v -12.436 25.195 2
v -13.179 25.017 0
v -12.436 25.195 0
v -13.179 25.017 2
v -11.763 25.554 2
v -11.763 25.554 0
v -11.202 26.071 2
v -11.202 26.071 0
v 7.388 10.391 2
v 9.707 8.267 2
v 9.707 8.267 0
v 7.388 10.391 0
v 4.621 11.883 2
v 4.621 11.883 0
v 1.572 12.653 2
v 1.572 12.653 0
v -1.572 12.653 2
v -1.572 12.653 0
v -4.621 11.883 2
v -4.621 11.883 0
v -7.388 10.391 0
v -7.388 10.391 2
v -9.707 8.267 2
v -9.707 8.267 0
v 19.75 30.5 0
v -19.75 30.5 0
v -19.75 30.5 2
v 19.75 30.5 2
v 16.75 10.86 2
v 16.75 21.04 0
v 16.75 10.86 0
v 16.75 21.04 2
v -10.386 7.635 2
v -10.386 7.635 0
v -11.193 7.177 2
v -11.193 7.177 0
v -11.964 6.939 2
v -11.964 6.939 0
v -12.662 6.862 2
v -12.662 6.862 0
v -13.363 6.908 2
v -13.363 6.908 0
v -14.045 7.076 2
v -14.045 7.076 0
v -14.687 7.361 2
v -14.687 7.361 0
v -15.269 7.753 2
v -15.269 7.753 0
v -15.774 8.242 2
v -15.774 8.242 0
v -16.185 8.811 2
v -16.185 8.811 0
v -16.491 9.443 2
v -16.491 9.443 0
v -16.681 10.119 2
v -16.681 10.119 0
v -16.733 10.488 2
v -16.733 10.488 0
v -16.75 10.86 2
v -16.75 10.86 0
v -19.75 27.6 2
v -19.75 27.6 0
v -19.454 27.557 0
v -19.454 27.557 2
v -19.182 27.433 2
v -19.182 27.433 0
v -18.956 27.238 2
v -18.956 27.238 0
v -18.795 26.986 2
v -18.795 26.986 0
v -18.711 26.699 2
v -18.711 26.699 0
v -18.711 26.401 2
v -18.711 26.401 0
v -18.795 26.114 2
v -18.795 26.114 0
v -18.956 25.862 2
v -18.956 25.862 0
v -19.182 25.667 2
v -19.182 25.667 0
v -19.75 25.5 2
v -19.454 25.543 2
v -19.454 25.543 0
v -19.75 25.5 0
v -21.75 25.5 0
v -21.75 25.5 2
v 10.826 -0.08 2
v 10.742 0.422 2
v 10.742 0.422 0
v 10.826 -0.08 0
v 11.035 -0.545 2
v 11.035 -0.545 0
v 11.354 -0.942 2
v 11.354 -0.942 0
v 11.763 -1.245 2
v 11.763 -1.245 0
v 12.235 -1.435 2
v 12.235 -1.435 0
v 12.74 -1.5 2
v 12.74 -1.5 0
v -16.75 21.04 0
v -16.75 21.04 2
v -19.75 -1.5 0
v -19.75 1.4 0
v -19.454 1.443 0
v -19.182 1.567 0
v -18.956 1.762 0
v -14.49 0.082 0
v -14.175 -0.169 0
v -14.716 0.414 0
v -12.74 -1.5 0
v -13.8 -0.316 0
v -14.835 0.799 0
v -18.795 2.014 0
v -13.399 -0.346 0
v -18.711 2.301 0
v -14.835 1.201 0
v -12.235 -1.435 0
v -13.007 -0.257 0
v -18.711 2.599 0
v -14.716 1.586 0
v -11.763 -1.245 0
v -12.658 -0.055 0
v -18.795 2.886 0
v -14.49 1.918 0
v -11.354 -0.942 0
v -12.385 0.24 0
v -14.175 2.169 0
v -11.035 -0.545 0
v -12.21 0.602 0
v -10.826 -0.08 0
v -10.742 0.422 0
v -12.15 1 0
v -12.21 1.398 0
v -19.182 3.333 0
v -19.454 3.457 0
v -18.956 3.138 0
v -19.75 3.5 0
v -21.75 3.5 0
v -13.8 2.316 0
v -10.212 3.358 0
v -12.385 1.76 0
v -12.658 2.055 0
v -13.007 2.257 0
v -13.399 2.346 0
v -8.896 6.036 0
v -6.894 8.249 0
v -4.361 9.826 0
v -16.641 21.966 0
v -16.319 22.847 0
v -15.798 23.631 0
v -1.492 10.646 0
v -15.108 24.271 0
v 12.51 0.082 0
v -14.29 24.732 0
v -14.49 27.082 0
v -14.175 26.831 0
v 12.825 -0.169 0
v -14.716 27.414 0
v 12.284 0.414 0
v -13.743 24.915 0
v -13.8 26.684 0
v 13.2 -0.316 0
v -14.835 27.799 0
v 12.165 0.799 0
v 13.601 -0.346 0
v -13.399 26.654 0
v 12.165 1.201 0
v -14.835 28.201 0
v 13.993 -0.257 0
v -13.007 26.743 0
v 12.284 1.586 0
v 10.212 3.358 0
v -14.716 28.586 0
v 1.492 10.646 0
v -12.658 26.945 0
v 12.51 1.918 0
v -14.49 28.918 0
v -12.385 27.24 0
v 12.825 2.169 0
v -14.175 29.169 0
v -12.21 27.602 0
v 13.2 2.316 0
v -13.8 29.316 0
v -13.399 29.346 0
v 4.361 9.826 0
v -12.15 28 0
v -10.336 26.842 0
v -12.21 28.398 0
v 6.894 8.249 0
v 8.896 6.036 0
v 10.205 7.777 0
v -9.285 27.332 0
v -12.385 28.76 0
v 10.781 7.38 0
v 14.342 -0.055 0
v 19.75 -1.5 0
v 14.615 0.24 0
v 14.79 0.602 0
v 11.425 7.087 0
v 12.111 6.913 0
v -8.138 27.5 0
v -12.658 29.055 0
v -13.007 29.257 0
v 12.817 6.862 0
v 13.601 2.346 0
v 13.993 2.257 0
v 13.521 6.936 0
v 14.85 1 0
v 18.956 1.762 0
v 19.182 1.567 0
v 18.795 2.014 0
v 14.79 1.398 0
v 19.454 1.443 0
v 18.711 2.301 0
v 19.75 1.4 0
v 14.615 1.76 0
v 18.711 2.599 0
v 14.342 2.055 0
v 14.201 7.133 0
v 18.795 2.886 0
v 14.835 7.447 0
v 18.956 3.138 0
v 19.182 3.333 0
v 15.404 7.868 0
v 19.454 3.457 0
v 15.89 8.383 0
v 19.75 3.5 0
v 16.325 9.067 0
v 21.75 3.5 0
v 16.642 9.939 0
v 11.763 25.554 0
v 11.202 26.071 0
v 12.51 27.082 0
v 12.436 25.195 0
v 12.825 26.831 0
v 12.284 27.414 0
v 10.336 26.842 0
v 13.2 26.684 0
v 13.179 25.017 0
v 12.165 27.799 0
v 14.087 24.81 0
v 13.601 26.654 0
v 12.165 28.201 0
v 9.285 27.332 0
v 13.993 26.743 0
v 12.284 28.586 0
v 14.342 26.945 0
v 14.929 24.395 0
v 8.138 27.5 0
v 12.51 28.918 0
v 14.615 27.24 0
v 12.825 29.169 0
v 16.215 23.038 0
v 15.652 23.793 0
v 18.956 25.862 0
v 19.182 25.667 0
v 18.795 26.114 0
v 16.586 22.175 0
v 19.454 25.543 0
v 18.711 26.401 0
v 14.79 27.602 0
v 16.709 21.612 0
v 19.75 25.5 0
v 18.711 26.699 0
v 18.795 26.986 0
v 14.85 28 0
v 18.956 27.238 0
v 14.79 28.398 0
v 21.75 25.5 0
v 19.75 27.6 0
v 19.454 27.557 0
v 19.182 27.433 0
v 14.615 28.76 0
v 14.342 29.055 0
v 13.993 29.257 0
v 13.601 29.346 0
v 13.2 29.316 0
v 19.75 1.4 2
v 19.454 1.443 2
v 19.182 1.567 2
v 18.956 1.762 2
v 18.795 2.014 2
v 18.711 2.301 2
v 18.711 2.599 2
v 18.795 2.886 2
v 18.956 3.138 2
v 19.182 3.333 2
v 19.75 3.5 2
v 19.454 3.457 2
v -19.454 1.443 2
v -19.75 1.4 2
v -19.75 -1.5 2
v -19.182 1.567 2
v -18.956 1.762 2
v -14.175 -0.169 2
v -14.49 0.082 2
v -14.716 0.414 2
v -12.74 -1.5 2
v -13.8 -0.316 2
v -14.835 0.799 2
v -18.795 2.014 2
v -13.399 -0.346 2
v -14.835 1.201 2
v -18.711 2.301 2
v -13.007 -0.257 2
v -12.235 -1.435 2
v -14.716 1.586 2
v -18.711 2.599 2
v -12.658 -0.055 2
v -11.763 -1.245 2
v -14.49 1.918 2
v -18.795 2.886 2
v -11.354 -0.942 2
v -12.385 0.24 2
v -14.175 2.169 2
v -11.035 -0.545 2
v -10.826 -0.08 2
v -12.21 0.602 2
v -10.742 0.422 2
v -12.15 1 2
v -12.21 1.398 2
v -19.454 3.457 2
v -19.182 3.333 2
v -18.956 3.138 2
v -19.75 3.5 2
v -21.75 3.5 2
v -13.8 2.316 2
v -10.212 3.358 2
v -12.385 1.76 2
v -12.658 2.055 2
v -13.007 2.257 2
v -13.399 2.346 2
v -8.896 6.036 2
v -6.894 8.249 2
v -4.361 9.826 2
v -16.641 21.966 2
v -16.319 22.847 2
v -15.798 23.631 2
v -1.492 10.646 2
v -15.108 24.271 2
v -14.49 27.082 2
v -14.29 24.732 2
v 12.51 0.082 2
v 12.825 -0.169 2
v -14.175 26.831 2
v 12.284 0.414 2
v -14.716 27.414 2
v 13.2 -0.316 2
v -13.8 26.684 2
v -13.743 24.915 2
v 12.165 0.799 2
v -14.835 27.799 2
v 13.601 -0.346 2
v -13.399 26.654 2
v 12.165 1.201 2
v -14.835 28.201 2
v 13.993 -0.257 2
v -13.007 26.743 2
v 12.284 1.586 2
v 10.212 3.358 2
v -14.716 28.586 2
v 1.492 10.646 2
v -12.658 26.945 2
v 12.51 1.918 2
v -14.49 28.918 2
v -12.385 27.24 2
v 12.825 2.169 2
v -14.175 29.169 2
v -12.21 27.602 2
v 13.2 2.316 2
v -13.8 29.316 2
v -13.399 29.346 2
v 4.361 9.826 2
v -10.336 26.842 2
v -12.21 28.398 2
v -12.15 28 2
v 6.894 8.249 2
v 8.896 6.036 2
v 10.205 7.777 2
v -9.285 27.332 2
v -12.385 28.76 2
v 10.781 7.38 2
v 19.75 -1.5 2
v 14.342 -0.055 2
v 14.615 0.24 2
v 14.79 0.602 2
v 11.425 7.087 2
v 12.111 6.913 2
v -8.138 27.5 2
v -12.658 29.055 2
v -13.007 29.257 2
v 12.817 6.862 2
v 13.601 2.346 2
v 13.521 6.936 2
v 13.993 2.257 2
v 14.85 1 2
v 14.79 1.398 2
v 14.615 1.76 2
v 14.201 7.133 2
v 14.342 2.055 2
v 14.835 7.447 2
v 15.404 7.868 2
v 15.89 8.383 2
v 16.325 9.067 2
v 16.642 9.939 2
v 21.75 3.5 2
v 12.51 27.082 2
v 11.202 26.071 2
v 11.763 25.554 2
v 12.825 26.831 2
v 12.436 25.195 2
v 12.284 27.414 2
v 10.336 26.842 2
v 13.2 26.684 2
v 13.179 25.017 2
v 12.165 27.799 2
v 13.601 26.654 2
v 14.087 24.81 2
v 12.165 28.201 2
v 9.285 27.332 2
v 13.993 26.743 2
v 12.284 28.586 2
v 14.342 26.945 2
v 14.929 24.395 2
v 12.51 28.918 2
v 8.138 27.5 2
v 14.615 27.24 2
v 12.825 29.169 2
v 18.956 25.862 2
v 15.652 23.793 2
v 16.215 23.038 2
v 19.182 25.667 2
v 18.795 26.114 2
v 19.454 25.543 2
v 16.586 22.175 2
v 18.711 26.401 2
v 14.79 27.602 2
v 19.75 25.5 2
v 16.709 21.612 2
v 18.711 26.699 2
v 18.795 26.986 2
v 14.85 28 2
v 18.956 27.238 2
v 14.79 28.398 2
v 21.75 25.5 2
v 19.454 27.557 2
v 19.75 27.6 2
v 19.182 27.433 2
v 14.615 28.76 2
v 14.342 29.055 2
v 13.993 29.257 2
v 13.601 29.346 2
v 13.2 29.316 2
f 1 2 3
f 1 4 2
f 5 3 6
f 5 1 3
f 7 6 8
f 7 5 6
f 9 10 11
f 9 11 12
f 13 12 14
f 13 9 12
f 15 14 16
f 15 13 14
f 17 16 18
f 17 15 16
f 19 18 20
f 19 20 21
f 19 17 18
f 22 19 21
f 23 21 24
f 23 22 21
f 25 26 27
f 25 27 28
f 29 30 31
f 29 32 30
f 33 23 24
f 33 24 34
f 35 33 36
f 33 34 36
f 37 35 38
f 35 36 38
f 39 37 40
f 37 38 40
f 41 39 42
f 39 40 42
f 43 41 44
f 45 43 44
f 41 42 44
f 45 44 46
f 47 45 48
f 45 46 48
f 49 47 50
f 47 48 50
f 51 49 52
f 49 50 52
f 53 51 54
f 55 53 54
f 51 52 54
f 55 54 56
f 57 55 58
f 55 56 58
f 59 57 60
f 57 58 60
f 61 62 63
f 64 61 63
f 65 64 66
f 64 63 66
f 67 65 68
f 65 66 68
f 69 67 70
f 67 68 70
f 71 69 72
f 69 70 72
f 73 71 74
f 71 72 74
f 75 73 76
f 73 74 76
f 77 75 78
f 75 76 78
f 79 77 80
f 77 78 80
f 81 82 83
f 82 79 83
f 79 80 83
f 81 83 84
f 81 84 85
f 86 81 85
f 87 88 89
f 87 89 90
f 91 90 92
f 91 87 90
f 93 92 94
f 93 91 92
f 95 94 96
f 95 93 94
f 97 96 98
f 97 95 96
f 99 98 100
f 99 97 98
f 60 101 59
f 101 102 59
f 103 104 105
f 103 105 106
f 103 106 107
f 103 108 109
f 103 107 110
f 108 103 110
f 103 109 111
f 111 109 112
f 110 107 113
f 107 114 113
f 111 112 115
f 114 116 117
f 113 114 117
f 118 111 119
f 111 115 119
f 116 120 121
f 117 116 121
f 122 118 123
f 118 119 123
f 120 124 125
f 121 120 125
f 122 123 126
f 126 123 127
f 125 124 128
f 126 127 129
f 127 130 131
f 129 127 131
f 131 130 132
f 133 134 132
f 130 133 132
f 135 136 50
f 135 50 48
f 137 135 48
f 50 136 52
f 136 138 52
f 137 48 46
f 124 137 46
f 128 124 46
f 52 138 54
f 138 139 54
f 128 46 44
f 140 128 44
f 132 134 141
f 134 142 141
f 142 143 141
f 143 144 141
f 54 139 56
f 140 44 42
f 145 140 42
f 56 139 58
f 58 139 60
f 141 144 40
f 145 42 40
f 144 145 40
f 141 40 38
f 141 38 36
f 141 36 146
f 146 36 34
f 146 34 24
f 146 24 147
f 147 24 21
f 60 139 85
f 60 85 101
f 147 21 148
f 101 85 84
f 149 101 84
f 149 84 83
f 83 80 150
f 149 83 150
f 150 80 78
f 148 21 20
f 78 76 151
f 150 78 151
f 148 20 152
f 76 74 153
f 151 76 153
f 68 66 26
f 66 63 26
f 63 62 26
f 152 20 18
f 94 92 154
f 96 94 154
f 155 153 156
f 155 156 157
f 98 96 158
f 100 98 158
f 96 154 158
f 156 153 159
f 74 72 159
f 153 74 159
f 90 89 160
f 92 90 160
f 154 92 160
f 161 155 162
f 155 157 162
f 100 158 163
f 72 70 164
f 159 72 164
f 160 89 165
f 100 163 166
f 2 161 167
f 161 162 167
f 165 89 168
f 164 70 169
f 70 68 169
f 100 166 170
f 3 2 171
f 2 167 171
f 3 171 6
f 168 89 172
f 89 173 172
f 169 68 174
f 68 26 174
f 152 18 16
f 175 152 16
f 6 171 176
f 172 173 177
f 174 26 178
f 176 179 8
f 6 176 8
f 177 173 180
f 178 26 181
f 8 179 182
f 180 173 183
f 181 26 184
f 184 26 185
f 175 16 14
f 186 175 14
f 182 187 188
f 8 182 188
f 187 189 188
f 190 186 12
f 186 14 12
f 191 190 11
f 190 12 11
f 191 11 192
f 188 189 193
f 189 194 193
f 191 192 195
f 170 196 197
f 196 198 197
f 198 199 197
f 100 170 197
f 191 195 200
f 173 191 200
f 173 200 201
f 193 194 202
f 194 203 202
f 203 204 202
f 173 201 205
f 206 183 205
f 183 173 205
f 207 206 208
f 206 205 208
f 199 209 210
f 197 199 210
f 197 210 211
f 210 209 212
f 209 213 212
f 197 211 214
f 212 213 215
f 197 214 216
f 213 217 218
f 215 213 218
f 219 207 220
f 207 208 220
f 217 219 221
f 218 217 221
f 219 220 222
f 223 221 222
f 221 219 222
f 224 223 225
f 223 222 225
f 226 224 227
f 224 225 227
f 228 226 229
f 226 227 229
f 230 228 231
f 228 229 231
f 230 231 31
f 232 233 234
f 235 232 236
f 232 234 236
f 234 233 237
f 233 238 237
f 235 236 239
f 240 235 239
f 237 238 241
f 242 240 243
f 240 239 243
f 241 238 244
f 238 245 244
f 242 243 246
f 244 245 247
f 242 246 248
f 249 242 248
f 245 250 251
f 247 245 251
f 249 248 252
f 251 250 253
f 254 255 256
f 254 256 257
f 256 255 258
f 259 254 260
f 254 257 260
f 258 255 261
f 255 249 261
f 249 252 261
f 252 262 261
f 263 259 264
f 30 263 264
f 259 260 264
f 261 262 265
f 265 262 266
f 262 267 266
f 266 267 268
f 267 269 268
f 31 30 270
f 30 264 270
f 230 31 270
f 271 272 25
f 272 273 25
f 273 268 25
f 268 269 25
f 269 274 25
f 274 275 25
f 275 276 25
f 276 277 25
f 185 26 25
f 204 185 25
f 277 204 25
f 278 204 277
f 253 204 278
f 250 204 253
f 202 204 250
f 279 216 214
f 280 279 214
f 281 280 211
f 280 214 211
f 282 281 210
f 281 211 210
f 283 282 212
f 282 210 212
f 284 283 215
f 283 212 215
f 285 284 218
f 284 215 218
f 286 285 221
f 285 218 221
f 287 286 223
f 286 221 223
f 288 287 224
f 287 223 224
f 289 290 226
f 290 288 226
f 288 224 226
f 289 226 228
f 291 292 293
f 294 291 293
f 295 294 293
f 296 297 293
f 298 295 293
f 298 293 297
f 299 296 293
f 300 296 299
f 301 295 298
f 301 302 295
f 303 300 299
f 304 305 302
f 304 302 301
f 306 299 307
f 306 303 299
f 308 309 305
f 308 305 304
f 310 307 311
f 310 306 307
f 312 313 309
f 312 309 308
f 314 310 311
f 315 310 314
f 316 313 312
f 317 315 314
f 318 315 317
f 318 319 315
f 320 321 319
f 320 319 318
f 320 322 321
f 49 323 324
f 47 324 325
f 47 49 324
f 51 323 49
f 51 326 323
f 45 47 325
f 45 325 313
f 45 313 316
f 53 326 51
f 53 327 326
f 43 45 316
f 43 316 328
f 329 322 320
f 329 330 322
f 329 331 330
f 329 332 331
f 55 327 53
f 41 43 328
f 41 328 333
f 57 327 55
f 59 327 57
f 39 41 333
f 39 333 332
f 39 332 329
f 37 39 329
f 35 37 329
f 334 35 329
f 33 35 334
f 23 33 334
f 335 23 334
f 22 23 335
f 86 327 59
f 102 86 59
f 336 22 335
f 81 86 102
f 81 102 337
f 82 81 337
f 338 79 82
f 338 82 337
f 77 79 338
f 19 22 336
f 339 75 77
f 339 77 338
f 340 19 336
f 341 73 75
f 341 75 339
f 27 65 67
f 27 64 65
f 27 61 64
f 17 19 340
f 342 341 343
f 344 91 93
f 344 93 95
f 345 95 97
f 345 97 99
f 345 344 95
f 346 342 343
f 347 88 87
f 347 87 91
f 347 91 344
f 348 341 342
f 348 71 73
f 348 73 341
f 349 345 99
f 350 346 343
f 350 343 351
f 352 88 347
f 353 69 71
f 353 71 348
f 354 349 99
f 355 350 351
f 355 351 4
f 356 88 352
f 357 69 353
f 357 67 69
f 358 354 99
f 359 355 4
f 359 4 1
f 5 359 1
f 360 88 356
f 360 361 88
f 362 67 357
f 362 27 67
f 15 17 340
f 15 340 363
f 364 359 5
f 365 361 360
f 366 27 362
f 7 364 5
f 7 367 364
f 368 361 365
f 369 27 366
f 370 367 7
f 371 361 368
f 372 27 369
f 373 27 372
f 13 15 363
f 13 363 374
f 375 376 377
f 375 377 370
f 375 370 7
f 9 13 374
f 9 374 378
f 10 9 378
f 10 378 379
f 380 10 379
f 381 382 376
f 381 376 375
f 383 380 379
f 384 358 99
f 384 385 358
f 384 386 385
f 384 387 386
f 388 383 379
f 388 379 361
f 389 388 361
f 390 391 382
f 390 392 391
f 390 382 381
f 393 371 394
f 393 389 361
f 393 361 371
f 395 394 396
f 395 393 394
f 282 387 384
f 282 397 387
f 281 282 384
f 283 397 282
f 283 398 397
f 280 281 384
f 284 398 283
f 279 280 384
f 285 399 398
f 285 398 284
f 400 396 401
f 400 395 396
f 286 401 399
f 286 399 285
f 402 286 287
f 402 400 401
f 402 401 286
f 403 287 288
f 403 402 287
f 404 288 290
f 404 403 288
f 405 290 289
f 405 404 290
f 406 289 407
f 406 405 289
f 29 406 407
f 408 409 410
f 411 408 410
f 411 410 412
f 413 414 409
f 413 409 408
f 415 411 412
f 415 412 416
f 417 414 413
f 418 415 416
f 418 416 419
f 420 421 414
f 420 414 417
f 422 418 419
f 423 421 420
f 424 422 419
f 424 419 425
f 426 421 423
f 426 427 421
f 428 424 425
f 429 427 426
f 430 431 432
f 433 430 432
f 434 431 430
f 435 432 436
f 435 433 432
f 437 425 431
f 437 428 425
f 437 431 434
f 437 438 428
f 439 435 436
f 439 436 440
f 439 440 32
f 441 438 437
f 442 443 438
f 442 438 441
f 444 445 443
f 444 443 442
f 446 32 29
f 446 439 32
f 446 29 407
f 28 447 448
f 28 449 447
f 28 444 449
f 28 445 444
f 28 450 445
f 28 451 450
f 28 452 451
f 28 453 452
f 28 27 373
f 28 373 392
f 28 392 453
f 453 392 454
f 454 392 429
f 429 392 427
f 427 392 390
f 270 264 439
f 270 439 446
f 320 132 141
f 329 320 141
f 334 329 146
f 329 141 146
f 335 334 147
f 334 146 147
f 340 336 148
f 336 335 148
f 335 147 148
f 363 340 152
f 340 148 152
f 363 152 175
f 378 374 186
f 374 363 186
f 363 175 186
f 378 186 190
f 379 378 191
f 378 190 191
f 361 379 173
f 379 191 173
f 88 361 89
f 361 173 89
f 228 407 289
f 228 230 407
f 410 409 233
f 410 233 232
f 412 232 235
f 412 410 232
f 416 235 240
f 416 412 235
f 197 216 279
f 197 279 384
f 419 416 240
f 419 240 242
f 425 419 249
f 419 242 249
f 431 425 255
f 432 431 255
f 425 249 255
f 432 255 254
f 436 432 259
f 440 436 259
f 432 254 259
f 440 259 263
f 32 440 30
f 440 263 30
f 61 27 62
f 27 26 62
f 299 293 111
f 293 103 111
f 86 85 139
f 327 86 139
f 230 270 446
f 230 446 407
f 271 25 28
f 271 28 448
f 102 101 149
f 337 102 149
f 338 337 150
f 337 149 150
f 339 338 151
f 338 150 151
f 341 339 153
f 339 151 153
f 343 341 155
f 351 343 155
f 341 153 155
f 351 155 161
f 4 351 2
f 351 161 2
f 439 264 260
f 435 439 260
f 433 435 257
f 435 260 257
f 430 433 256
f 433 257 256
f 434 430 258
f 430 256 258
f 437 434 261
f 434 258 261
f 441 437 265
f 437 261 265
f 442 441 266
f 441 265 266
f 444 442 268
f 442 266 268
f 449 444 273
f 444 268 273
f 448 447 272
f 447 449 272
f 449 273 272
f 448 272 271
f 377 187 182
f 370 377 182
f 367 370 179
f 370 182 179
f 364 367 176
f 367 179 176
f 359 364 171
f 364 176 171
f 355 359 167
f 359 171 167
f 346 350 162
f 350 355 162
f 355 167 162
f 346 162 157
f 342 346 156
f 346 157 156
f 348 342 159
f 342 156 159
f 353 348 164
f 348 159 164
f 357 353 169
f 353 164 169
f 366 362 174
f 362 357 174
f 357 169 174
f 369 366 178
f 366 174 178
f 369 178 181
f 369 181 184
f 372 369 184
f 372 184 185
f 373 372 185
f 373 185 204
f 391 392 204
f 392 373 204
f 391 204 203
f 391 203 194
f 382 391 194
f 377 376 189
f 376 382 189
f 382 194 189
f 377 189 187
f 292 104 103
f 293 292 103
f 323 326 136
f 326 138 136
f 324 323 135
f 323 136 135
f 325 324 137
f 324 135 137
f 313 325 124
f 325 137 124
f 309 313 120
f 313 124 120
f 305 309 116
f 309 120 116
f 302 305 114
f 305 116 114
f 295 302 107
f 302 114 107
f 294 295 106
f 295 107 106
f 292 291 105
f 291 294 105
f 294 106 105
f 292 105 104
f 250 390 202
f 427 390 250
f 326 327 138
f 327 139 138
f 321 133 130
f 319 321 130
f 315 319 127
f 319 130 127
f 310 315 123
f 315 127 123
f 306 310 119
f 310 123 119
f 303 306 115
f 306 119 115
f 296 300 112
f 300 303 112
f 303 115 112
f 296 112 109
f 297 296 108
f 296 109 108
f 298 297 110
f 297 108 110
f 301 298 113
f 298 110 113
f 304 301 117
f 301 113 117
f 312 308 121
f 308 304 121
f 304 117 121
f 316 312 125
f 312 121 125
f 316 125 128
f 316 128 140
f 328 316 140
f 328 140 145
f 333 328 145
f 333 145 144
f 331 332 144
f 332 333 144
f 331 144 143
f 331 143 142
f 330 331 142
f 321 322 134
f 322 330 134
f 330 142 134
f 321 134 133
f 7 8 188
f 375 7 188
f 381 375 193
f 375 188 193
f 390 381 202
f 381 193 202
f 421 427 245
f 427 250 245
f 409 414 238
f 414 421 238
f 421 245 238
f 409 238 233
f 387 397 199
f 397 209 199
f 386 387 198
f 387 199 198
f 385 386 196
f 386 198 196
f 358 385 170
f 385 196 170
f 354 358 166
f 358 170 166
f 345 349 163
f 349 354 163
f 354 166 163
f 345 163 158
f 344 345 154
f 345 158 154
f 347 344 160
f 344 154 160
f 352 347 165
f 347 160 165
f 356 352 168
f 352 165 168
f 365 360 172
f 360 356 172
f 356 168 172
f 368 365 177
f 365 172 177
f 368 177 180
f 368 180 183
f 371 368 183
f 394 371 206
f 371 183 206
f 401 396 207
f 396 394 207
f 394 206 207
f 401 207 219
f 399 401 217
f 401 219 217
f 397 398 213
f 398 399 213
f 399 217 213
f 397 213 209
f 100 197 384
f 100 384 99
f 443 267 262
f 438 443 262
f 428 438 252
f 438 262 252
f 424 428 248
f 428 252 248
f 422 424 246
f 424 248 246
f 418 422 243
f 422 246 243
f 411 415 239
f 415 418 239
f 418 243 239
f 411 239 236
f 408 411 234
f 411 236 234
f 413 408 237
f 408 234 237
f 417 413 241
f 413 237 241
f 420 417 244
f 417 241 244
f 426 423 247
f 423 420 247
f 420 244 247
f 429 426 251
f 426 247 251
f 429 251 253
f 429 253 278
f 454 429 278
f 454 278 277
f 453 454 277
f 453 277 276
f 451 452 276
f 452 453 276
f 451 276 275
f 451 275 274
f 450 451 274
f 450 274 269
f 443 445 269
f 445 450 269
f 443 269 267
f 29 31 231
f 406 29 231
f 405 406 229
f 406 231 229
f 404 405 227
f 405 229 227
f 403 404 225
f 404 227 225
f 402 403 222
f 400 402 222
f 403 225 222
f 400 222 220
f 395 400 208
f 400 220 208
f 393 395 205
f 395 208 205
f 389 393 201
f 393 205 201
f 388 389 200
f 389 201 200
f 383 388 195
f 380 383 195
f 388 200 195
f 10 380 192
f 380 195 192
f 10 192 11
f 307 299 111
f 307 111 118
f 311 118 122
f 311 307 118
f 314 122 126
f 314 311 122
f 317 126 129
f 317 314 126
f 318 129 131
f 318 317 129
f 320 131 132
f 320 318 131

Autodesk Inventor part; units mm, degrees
ref_plane "YZ Plane" through (0, 0, 0) normal (1, 0, 0) x (0, 1, 0)
ref_plane "XZ Plane" through (0, 0, 0) normal (0, 1, 0) x (-1, 0, 0)
ref_plane "XY Plane" through (0, 0, 0) normal (0, 0, 1) x (1, 0, 0)
sketch "スケッチ1" plane through (0, 0, 0) normal (0, 0, 1) x (1, 0, 0)
  circle A0 centre (0, 0) radius 10.5 construction
  circle A1 centre (-13.5, 1) radius 1.35
  line L0 (-13.5, 28) -> (13.5, 28) construction
  line L1 (13.5, 28) -> (13.5, 1) construction
  line L2 (13.5, 1) -> (-13.5, 1) construction
  line L3 (-13.5, 1) -> (-13.5, 28) construction
  circle A2 centre (-13.5, 28) radius 1.35
  circle A3 centre (13.5, 1) radius 1.35
  circle A4 centre (13.5, 28) radius 1.35
  line L4 (-19.75, 30.5) -> (-19.75, 27.6)
  line L5 (-19.75, 30.5) -> (19.75, 30.5)
  line L6 (19.75, 30.5) -> (19.75, 27.6)
  line L7 (-19.75, 1.4) -> (-19.75, -1.5)
  line L8 (-19.75, -1.5) -> (-10.6448, -1.5)
  line L9 (19.75, 1.4) -> (19.75, -1.5)
  line L10 (19.75, -1.5) -> (10.6448, -1.5)
  line L11 (-19.75, 25.5) -> (-21.75, 25.5)
  line L12 (-21.75, 25.5) -> (-21.75, 3.5)
  line L13 (-21.75, 3.5) -> (-19.75, 3.5)
  arc A5 (-19.75, 25.5) -> (-19.75, 27.6) centre (-19.75, 26.55) ccw
  arc A6 (-19.75, 1.4) -> (-19.75, 3.5) centre (-19.75, 2.45) ccw
  line L14 (19.75, 25.5) -> (21.75, 25.5)
  line L15 (21.75, 25.5) -> (21.75, 3.5)
  line L16 (21.75, 3.5) -> (19.75, 3.5)
  arc A7 (19.75, 27.6) -> (19.75, 25.5) centre (19.75, 26.55) ccw
  line L17 (0, 28) -> (0, 0) construction
  arc A8 (19.75, 3.5) -> (19.75, 1.4) centre (19.75, 2.45) ccw
  line L18 (-13.5, 14.5) -> (-21.75, 14.5) construction
  arc A9 (10.6448, -1.5) -> (-10.6448, -1.5) centre (0, 0) ccw
  point P0 (0, 30.5)
  dimension "d8" = 21
  dimension "d10" = 27
  dimension "d12" = 1
  dimension "d13" = 2.7
  dimension "d38" = 27
  dimension "d44" = 27
  dimension "d47" = 1.05
  dimension "d48" = 39.5
  dimension "d49" = 2
  dimension "d50" = 5
  dimension "d51" = 32
  dimension "d52" = 5
  dimension "d53" = 10.75
extrude "押し出し1" add sketch "スケッチ1" along normal blind 2
sketch "スケッチ2" plane through (0, 0, 2) normal (0, 0, 1) x (1, 0, 0)
  circle A0 centre (13.5, 28) radius 1.35 projected
  circle A1 centre (-13.5, 28) radius 1.35 projected
  circle A2 centre (-13.5, 1) radius 1.35 projected
  line L0 (-19.75, 30.5) -> (-19.75, 27.6) projected
  arc A3 (10.6448, -1.5) -> (-10.6448, -1.5) centre (0, 0) ccw projected
  line L1 (19.75, 30.5) -> (-19.75, 30.5) projected
  line L2 (-10.542, 27.5) -> (10.542, 27.5)
  line L3 (-16.75, 25) -> (-16.75, 5)
  line L4 (16.75, 25) -> (16.75, 5)
  line L5 (-16.75, 5) -> (-11.7287, 5)
  line L6 (16.75, 5) -> (11.7287, 5)
  arc A4 (11.7287, 5) -> (-11.7287, 5) centre (0, 0) ccw
  line L7 (-16.75, 25) -> (-13.5, 25)
  arc A5 (-13.5, 25) -> (-10.542, 27.5) centre (-13.5, 28) ccw
  line L8 (16.75, 25) -> (13.5, 25)
  arc A6 (10.542, 27.5) -> (13.5, 25) centre (13.5, 28) ccw
  line L9 (0, 30.5) -> (0, 0) construction
  dimension "d56" = 2
  dimension "d57" = 4
  dimension "d58" = 3
  dimension "d59" = 3
  dimension "d60" = 3
extrude "押し出し2" cut sketch "スケッチ2" against normal blind 10 contours L2 A6 L8 L4 L6 A4 L5 L3 L7 A5
fillet "フィレット1" radius 4 8 edges at (10.542, 27.5, 1) (16.75, 25, 1) (16.75, 5, 1) (11.7287, 5, 1) (-11.7287, 5, 1) (-16.75, 5, 1) (-16.75, 25, 1) (-10.542, 27.5, 1)
fillet "フィレット1" radius 2 2 edges at (-10.6448, -1.5, 1) (10.6448, -1.5, 1)
equation "\"d38\" = d10"
equation "\"d44\" = d10"
equation "\"d50\" = d30"
equation "\"d51\" = d18 + 2 * d30"
equation "\"d52\" = d50"
equation "\"d30\" = 5"
equation "\"d18\" = 22"
properties part number "足首_サブフレーム_1_1" material "アルミニウム 2014-T4"
